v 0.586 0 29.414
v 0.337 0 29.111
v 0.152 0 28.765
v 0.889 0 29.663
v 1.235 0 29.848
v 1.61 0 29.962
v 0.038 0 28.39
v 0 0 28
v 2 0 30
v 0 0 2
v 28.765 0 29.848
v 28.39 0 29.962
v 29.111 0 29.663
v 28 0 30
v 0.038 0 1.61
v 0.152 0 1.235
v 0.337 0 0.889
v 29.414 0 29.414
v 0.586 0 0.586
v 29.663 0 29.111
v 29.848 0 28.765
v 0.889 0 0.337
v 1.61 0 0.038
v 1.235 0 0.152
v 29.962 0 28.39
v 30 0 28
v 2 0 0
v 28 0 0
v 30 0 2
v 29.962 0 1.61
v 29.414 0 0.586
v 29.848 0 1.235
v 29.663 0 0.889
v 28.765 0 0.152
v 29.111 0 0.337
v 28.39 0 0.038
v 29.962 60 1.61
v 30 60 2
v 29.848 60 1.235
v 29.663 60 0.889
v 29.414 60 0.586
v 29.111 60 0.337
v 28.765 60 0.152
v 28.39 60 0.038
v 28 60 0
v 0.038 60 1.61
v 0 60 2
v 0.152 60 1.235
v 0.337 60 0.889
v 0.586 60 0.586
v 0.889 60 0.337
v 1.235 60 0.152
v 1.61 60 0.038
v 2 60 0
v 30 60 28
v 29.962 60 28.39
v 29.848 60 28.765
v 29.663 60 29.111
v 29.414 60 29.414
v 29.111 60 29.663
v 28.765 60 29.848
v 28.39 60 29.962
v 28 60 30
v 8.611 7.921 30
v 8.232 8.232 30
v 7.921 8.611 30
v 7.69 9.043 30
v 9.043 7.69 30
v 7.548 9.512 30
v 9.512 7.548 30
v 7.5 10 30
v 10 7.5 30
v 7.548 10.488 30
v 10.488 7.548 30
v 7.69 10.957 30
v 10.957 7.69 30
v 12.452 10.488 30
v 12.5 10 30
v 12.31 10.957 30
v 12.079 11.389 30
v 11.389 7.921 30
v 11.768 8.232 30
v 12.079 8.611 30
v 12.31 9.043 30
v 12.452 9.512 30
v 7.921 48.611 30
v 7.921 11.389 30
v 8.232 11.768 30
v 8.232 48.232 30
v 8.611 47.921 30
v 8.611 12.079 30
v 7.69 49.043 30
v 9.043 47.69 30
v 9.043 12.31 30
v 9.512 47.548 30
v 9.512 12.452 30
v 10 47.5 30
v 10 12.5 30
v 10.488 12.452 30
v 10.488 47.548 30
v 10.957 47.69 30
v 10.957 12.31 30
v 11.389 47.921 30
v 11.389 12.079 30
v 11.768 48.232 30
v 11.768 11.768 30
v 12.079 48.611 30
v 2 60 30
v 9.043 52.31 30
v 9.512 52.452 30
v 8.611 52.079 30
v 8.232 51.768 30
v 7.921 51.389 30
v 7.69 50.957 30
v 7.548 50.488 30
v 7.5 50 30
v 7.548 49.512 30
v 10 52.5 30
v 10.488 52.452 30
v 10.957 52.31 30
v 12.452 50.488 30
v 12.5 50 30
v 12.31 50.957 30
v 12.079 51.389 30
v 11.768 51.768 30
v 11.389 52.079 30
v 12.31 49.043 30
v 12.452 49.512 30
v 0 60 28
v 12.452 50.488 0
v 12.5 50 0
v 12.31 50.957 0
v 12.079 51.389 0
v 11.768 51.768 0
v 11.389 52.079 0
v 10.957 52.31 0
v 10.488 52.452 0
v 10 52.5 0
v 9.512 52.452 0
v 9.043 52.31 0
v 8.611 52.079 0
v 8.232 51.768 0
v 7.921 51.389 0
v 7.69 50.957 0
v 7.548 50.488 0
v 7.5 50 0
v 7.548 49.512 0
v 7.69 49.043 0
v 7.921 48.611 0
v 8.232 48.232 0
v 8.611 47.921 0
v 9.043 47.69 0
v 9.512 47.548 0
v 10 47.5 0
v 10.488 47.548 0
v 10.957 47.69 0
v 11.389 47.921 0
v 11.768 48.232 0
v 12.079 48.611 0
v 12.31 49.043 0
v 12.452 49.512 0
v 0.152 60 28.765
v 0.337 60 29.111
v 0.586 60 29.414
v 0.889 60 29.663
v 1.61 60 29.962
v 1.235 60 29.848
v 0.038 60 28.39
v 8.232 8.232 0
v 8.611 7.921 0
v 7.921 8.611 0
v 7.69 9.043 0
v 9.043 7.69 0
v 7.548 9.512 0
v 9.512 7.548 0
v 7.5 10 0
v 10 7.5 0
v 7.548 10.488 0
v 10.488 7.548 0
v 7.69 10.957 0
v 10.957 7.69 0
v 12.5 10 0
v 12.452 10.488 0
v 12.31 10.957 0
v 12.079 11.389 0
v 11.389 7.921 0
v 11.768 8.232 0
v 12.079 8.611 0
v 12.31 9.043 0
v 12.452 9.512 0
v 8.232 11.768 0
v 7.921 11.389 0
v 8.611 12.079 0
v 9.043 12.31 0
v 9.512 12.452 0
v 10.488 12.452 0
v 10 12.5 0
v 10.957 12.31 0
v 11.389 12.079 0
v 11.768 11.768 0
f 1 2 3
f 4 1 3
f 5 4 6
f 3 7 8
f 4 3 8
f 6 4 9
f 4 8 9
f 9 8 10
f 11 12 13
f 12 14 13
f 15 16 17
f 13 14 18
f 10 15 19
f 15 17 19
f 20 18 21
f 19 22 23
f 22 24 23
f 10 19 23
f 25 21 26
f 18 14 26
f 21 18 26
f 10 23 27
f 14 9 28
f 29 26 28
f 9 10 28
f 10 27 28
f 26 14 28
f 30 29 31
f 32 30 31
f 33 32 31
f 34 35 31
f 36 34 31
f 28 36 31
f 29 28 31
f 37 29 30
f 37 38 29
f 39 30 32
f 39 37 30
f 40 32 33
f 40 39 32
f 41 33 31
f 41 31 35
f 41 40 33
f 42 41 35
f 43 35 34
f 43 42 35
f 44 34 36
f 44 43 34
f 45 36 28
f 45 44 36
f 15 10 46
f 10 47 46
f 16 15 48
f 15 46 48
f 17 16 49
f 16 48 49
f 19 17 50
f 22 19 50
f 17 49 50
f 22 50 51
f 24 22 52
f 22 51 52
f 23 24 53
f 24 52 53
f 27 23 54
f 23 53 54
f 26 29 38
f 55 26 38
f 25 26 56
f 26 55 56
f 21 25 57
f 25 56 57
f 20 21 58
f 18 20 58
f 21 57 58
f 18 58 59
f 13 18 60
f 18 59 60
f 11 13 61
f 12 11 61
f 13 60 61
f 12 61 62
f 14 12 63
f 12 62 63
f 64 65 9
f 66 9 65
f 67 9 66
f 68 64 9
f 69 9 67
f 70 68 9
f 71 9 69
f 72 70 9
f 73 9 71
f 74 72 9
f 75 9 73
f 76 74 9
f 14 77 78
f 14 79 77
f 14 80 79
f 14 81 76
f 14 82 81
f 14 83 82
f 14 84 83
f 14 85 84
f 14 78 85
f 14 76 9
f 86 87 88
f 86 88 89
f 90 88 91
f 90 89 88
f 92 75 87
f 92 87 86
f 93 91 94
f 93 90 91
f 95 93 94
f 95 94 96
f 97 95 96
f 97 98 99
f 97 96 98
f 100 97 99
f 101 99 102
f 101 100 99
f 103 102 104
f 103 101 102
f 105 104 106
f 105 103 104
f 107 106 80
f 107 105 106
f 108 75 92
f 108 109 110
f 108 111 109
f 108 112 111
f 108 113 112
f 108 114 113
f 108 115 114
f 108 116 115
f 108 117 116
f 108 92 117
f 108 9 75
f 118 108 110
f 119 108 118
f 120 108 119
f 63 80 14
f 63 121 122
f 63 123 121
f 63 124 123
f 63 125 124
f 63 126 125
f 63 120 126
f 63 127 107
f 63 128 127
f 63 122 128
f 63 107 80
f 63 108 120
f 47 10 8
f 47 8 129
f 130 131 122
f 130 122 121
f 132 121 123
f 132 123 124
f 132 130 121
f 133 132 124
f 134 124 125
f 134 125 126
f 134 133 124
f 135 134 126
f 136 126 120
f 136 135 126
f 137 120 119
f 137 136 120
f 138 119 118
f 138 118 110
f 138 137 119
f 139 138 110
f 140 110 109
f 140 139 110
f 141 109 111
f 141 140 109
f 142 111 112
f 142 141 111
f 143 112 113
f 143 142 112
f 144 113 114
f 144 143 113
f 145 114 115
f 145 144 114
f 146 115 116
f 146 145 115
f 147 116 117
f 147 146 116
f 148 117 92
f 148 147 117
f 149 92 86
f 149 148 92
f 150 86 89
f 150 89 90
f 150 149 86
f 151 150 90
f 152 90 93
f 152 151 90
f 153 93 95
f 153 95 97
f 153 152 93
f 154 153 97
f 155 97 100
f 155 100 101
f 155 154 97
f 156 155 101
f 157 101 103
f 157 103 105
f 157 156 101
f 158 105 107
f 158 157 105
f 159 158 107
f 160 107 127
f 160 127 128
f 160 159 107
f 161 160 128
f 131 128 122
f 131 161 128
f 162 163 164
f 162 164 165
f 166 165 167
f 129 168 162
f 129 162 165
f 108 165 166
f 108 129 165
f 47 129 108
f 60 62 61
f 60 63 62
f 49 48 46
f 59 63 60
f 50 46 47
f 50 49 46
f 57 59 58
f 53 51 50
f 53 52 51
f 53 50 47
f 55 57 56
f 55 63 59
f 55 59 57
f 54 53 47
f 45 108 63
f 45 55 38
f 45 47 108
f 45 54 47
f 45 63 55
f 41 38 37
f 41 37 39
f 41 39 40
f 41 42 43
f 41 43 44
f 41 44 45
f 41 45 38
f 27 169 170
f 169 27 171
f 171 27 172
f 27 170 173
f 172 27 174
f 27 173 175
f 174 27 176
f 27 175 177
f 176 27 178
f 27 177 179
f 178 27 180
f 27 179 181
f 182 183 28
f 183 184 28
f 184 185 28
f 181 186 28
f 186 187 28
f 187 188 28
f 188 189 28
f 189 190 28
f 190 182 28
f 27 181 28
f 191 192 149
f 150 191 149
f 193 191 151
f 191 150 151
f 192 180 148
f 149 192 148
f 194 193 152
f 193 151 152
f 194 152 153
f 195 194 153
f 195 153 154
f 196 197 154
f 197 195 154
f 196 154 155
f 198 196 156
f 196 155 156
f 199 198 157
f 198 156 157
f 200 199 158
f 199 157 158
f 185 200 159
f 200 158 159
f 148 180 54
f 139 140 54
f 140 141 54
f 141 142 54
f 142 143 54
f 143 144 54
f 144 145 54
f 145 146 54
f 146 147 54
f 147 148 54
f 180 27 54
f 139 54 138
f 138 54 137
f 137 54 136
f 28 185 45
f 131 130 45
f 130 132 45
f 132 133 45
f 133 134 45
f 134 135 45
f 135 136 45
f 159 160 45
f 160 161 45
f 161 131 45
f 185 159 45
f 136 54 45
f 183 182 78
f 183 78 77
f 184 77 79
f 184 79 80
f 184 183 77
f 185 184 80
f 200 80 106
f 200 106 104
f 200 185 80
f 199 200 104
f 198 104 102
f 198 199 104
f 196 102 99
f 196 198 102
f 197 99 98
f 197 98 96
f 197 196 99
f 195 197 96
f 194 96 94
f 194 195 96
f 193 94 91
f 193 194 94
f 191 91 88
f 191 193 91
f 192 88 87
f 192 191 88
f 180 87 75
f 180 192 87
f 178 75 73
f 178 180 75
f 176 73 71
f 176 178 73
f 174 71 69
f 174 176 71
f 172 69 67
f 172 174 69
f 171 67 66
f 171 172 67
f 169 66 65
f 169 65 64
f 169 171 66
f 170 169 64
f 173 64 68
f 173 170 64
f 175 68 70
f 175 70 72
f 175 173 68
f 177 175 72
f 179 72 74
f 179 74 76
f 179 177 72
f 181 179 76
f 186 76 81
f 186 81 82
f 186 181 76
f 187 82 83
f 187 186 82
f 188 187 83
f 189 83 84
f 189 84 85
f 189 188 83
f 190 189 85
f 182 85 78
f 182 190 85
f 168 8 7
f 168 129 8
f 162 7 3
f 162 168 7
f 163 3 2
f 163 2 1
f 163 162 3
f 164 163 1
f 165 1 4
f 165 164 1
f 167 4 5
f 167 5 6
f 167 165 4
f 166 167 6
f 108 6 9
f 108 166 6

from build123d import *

# Parameters (mm, degrees)
ESQUISSE1_W      = 30
ESQUISSE1_H      = 60
ESQUISSE1_R      = 2.5
EXTRUSION1_DEPTH = 30
CONG_1_R         = 2


with BuildPart() as part:
    # Esquisse1 → Extrusion1 (new body)
    with BuildSketch(Plane.XY):
        with Locations((15, 30)):
            Rectangle(ESQUISSE1_W, ESQUISSE1_H)
        with Locations((10, 50)):
            Circle(ESQUISSE1_R, mode=Mode.SUBTRACT)
        with Locations((10, 10)):
            Circle(ESQUISSE1_R, mode=Mode.SUBTRACT)
    extrude(amount=EXTRUSION1_DEPTH)

    # Congé1
    cong_1_edges = [part.edges().sort_by_distance(p)[0] for p in [
        (30, 30, 30),
        (0, 30, 30),
        (30, 30, 0),
        (0, 30, 0),
    ]]
    fillet(cong_1_edges, radius=CONG_1_R)


solid = part.part
